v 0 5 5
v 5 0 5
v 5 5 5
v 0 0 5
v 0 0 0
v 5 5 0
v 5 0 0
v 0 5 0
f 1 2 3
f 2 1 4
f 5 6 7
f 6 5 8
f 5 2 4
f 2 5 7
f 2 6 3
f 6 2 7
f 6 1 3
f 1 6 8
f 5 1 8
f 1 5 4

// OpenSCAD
// 2D object mixed with 3D: render warnings
cube(5);
square(3);
